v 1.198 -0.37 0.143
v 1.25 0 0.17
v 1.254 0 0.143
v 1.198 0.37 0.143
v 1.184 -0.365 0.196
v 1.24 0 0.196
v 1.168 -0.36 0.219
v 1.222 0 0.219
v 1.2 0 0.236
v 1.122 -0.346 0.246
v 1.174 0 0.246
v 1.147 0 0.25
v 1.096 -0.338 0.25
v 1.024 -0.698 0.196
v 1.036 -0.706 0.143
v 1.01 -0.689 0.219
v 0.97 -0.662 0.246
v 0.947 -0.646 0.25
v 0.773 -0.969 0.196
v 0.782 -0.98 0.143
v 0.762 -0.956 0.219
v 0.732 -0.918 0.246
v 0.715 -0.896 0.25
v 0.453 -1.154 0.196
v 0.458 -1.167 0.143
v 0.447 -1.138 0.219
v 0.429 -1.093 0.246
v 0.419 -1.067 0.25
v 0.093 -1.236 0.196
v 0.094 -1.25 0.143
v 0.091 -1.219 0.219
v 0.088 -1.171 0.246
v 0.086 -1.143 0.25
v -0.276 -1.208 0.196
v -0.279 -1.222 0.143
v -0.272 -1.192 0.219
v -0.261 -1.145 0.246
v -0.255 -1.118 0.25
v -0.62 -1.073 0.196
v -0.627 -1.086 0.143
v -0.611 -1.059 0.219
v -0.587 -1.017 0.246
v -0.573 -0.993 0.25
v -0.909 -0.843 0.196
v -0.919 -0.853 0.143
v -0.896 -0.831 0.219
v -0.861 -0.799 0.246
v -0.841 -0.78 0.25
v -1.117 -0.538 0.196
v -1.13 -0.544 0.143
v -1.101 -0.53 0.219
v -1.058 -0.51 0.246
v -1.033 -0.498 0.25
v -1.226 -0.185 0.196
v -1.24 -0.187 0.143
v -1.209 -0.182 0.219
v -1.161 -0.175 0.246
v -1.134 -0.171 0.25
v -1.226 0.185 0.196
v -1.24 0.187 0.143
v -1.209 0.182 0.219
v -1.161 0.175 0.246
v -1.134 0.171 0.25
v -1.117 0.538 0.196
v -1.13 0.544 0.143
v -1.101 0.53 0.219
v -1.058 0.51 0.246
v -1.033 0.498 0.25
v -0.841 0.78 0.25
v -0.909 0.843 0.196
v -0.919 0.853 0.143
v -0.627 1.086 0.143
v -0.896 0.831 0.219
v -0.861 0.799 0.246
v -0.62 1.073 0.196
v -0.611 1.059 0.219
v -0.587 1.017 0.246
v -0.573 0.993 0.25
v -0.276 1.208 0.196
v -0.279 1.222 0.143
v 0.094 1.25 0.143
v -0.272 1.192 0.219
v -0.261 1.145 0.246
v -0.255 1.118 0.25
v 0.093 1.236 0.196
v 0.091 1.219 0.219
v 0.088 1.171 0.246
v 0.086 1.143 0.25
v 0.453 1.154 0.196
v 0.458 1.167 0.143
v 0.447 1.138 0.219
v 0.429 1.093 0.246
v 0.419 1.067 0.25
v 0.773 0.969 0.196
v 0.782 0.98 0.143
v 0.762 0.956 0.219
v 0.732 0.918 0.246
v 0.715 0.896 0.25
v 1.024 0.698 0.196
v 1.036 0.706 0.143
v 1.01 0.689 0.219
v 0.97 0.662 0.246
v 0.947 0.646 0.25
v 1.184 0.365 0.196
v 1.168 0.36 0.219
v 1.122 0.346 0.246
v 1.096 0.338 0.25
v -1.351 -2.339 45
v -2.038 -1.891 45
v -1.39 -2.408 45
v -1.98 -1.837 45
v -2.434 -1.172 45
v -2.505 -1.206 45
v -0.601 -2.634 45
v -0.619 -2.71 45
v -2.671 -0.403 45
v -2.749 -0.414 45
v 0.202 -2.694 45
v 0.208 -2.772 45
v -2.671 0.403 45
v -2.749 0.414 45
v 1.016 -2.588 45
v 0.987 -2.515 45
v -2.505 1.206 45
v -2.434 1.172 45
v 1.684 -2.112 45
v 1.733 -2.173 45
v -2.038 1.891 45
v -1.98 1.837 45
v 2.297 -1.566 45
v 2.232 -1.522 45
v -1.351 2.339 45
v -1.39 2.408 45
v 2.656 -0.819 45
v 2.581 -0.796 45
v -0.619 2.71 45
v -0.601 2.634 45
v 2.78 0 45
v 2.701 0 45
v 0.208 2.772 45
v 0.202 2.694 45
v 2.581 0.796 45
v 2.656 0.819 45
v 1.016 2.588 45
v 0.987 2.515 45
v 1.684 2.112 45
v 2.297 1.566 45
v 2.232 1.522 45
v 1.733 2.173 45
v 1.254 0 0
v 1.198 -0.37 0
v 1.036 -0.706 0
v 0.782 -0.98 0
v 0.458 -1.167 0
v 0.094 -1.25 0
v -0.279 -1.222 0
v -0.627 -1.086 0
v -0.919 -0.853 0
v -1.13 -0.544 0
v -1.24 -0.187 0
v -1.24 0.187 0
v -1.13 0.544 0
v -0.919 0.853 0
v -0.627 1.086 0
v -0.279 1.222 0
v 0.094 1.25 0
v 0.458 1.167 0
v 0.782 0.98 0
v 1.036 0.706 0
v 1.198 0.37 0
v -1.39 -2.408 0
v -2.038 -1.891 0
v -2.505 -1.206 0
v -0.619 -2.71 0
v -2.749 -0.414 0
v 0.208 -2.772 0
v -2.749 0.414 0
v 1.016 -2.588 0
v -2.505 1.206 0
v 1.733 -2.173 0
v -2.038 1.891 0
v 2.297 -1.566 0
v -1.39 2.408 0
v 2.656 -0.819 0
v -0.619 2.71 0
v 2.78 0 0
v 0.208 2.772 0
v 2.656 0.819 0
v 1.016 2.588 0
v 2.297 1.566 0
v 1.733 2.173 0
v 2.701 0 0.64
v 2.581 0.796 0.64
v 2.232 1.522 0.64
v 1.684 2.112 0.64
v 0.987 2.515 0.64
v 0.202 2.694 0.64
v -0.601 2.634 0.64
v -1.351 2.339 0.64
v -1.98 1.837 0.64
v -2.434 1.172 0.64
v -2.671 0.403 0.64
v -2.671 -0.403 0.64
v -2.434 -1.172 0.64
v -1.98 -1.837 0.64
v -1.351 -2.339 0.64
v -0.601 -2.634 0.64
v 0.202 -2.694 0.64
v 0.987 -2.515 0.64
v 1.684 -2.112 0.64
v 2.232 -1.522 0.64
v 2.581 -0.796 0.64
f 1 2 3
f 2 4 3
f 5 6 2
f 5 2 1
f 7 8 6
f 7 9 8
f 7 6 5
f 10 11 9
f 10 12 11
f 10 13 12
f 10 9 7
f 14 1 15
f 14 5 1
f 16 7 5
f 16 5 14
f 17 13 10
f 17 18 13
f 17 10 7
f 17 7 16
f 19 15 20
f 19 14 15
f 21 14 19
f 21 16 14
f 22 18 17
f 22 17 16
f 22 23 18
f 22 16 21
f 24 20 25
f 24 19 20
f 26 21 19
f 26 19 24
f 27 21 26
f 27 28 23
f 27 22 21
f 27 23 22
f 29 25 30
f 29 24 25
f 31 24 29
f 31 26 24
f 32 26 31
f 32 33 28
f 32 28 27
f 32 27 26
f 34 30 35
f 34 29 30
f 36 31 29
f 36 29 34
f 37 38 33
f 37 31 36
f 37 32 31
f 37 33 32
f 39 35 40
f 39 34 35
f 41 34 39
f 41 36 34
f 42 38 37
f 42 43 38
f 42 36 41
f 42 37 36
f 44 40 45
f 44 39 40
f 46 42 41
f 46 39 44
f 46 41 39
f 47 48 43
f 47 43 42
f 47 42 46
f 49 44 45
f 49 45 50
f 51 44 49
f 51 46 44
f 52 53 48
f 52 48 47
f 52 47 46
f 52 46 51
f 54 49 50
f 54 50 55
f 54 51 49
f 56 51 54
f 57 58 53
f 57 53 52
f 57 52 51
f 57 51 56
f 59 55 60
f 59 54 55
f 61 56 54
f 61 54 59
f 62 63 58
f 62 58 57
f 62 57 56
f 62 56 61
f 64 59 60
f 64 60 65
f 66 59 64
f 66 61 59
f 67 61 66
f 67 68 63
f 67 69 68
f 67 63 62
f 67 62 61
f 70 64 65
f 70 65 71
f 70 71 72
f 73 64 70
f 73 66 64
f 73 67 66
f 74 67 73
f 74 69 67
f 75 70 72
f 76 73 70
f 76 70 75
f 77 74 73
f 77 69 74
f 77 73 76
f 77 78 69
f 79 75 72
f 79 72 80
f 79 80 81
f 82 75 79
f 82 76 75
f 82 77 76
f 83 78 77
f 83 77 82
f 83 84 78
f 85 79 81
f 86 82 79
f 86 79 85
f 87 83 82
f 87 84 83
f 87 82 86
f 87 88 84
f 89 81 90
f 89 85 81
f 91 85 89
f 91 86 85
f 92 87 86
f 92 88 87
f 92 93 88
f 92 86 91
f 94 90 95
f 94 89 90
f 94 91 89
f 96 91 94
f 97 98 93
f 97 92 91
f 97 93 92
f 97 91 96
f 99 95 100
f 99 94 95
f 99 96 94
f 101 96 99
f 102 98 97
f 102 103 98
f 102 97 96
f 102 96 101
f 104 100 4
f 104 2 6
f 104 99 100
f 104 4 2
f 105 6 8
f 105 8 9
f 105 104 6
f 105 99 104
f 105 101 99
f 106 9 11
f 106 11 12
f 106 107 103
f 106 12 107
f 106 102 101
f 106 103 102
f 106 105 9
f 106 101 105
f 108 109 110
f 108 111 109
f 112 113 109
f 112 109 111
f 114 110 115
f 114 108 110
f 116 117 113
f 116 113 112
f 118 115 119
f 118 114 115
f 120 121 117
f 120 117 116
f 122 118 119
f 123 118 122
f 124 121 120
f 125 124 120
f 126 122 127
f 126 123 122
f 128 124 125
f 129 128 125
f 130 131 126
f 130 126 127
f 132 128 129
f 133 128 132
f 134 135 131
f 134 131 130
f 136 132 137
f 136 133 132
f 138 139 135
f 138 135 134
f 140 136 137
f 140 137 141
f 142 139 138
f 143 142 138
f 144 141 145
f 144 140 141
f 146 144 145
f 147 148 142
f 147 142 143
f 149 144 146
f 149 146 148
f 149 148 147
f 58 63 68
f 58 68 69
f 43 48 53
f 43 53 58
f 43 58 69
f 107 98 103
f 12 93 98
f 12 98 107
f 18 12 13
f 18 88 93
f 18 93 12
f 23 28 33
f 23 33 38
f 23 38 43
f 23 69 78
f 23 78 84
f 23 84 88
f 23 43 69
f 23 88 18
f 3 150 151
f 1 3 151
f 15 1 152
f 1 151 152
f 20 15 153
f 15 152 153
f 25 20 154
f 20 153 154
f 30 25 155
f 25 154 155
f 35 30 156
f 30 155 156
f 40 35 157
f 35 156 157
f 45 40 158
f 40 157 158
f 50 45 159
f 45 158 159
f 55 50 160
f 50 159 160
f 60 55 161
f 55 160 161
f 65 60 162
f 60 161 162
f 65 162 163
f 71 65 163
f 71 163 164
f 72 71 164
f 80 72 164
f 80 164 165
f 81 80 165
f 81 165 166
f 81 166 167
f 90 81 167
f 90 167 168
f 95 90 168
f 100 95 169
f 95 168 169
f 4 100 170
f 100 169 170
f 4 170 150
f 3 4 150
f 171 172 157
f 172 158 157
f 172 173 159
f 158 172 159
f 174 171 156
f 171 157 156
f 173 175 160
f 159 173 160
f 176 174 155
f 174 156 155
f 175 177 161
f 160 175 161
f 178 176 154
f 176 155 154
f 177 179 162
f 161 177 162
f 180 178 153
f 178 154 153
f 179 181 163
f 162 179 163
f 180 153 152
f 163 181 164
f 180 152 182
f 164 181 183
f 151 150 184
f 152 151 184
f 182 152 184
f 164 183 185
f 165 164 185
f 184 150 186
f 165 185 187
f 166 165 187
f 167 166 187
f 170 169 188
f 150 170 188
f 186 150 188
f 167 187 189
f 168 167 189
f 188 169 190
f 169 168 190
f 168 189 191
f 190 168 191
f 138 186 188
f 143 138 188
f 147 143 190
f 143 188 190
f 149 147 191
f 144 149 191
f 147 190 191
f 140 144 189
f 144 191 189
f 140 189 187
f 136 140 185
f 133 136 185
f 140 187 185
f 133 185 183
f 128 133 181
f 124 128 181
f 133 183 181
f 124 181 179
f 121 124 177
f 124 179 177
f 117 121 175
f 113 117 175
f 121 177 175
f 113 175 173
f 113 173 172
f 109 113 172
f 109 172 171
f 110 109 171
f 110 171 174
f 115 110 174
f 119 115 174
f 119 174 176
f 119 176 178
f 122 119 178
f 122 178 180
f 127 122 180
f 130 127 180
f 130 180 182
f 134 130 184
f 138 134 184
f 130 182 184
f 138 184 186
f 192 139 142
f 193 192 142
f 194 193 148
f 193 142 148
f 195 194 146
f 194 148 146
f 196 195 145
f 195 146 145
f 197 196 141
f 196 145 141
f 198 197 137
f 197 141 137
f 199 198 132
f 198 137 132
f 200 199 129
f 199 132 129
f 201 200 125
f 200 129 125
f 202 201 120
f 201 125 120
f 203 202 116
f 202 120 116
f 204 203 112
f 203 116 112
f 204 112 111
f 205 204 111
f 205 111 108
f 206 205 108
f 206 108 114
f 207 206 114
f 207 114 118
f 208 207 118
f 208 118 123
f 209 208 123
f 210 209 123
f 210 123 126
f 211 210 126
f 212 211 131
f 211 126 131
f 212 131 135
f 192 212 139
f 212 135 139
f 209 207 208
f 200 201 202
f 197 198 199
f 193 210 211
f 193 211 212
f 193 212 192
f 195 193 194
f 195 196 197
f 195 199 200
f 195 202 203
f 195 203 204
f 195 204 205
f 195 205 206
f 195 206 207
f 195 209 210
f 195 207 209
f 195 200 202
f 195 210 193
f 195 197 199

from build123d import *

# Parameters (mm, degrees)
F0_R     = 2.78
F1_DEPTH = 45
F2_R     = 2.701299
F3_DEPTH = 44.35984
F4_R     = 1.253885
F5_DEPTH = 0.25
F6_R     = 0.107264


with BuildPart() as f1:
    # F0 (on Top) → F1 (new body)
    with BuildSketch(Plane.XY):
        Circle(F0_R)
    extrude(amount=F1_DEPTH)

    # F2 (on face) → F3 (cut)
    with BuildSketch(Plane.XY.offset(45)):
        Circle(F2_R)
    extrude(amount=-F3_DEPTH, mode=Mode.SUBTRACT)

    # F4 (on face) → F5 (cut)
    with BuildSketch(Plane(origin=(0, 0, 0), x_dir=(1, 0, 0), z_dir=(0, 0, -1))):
        Circle(F4_R)
    extrude(amount=-F5_DEPTH, mode=Mode.SUBTRACT)

    # F6
    f6_edges = [f1.edges().sort_by_distance(p)[0] for p in [
        (-1.253885, 0, 0.25),
    ]]
    fillet(f6_edges, radius=F6_R)


solid = f1.part
